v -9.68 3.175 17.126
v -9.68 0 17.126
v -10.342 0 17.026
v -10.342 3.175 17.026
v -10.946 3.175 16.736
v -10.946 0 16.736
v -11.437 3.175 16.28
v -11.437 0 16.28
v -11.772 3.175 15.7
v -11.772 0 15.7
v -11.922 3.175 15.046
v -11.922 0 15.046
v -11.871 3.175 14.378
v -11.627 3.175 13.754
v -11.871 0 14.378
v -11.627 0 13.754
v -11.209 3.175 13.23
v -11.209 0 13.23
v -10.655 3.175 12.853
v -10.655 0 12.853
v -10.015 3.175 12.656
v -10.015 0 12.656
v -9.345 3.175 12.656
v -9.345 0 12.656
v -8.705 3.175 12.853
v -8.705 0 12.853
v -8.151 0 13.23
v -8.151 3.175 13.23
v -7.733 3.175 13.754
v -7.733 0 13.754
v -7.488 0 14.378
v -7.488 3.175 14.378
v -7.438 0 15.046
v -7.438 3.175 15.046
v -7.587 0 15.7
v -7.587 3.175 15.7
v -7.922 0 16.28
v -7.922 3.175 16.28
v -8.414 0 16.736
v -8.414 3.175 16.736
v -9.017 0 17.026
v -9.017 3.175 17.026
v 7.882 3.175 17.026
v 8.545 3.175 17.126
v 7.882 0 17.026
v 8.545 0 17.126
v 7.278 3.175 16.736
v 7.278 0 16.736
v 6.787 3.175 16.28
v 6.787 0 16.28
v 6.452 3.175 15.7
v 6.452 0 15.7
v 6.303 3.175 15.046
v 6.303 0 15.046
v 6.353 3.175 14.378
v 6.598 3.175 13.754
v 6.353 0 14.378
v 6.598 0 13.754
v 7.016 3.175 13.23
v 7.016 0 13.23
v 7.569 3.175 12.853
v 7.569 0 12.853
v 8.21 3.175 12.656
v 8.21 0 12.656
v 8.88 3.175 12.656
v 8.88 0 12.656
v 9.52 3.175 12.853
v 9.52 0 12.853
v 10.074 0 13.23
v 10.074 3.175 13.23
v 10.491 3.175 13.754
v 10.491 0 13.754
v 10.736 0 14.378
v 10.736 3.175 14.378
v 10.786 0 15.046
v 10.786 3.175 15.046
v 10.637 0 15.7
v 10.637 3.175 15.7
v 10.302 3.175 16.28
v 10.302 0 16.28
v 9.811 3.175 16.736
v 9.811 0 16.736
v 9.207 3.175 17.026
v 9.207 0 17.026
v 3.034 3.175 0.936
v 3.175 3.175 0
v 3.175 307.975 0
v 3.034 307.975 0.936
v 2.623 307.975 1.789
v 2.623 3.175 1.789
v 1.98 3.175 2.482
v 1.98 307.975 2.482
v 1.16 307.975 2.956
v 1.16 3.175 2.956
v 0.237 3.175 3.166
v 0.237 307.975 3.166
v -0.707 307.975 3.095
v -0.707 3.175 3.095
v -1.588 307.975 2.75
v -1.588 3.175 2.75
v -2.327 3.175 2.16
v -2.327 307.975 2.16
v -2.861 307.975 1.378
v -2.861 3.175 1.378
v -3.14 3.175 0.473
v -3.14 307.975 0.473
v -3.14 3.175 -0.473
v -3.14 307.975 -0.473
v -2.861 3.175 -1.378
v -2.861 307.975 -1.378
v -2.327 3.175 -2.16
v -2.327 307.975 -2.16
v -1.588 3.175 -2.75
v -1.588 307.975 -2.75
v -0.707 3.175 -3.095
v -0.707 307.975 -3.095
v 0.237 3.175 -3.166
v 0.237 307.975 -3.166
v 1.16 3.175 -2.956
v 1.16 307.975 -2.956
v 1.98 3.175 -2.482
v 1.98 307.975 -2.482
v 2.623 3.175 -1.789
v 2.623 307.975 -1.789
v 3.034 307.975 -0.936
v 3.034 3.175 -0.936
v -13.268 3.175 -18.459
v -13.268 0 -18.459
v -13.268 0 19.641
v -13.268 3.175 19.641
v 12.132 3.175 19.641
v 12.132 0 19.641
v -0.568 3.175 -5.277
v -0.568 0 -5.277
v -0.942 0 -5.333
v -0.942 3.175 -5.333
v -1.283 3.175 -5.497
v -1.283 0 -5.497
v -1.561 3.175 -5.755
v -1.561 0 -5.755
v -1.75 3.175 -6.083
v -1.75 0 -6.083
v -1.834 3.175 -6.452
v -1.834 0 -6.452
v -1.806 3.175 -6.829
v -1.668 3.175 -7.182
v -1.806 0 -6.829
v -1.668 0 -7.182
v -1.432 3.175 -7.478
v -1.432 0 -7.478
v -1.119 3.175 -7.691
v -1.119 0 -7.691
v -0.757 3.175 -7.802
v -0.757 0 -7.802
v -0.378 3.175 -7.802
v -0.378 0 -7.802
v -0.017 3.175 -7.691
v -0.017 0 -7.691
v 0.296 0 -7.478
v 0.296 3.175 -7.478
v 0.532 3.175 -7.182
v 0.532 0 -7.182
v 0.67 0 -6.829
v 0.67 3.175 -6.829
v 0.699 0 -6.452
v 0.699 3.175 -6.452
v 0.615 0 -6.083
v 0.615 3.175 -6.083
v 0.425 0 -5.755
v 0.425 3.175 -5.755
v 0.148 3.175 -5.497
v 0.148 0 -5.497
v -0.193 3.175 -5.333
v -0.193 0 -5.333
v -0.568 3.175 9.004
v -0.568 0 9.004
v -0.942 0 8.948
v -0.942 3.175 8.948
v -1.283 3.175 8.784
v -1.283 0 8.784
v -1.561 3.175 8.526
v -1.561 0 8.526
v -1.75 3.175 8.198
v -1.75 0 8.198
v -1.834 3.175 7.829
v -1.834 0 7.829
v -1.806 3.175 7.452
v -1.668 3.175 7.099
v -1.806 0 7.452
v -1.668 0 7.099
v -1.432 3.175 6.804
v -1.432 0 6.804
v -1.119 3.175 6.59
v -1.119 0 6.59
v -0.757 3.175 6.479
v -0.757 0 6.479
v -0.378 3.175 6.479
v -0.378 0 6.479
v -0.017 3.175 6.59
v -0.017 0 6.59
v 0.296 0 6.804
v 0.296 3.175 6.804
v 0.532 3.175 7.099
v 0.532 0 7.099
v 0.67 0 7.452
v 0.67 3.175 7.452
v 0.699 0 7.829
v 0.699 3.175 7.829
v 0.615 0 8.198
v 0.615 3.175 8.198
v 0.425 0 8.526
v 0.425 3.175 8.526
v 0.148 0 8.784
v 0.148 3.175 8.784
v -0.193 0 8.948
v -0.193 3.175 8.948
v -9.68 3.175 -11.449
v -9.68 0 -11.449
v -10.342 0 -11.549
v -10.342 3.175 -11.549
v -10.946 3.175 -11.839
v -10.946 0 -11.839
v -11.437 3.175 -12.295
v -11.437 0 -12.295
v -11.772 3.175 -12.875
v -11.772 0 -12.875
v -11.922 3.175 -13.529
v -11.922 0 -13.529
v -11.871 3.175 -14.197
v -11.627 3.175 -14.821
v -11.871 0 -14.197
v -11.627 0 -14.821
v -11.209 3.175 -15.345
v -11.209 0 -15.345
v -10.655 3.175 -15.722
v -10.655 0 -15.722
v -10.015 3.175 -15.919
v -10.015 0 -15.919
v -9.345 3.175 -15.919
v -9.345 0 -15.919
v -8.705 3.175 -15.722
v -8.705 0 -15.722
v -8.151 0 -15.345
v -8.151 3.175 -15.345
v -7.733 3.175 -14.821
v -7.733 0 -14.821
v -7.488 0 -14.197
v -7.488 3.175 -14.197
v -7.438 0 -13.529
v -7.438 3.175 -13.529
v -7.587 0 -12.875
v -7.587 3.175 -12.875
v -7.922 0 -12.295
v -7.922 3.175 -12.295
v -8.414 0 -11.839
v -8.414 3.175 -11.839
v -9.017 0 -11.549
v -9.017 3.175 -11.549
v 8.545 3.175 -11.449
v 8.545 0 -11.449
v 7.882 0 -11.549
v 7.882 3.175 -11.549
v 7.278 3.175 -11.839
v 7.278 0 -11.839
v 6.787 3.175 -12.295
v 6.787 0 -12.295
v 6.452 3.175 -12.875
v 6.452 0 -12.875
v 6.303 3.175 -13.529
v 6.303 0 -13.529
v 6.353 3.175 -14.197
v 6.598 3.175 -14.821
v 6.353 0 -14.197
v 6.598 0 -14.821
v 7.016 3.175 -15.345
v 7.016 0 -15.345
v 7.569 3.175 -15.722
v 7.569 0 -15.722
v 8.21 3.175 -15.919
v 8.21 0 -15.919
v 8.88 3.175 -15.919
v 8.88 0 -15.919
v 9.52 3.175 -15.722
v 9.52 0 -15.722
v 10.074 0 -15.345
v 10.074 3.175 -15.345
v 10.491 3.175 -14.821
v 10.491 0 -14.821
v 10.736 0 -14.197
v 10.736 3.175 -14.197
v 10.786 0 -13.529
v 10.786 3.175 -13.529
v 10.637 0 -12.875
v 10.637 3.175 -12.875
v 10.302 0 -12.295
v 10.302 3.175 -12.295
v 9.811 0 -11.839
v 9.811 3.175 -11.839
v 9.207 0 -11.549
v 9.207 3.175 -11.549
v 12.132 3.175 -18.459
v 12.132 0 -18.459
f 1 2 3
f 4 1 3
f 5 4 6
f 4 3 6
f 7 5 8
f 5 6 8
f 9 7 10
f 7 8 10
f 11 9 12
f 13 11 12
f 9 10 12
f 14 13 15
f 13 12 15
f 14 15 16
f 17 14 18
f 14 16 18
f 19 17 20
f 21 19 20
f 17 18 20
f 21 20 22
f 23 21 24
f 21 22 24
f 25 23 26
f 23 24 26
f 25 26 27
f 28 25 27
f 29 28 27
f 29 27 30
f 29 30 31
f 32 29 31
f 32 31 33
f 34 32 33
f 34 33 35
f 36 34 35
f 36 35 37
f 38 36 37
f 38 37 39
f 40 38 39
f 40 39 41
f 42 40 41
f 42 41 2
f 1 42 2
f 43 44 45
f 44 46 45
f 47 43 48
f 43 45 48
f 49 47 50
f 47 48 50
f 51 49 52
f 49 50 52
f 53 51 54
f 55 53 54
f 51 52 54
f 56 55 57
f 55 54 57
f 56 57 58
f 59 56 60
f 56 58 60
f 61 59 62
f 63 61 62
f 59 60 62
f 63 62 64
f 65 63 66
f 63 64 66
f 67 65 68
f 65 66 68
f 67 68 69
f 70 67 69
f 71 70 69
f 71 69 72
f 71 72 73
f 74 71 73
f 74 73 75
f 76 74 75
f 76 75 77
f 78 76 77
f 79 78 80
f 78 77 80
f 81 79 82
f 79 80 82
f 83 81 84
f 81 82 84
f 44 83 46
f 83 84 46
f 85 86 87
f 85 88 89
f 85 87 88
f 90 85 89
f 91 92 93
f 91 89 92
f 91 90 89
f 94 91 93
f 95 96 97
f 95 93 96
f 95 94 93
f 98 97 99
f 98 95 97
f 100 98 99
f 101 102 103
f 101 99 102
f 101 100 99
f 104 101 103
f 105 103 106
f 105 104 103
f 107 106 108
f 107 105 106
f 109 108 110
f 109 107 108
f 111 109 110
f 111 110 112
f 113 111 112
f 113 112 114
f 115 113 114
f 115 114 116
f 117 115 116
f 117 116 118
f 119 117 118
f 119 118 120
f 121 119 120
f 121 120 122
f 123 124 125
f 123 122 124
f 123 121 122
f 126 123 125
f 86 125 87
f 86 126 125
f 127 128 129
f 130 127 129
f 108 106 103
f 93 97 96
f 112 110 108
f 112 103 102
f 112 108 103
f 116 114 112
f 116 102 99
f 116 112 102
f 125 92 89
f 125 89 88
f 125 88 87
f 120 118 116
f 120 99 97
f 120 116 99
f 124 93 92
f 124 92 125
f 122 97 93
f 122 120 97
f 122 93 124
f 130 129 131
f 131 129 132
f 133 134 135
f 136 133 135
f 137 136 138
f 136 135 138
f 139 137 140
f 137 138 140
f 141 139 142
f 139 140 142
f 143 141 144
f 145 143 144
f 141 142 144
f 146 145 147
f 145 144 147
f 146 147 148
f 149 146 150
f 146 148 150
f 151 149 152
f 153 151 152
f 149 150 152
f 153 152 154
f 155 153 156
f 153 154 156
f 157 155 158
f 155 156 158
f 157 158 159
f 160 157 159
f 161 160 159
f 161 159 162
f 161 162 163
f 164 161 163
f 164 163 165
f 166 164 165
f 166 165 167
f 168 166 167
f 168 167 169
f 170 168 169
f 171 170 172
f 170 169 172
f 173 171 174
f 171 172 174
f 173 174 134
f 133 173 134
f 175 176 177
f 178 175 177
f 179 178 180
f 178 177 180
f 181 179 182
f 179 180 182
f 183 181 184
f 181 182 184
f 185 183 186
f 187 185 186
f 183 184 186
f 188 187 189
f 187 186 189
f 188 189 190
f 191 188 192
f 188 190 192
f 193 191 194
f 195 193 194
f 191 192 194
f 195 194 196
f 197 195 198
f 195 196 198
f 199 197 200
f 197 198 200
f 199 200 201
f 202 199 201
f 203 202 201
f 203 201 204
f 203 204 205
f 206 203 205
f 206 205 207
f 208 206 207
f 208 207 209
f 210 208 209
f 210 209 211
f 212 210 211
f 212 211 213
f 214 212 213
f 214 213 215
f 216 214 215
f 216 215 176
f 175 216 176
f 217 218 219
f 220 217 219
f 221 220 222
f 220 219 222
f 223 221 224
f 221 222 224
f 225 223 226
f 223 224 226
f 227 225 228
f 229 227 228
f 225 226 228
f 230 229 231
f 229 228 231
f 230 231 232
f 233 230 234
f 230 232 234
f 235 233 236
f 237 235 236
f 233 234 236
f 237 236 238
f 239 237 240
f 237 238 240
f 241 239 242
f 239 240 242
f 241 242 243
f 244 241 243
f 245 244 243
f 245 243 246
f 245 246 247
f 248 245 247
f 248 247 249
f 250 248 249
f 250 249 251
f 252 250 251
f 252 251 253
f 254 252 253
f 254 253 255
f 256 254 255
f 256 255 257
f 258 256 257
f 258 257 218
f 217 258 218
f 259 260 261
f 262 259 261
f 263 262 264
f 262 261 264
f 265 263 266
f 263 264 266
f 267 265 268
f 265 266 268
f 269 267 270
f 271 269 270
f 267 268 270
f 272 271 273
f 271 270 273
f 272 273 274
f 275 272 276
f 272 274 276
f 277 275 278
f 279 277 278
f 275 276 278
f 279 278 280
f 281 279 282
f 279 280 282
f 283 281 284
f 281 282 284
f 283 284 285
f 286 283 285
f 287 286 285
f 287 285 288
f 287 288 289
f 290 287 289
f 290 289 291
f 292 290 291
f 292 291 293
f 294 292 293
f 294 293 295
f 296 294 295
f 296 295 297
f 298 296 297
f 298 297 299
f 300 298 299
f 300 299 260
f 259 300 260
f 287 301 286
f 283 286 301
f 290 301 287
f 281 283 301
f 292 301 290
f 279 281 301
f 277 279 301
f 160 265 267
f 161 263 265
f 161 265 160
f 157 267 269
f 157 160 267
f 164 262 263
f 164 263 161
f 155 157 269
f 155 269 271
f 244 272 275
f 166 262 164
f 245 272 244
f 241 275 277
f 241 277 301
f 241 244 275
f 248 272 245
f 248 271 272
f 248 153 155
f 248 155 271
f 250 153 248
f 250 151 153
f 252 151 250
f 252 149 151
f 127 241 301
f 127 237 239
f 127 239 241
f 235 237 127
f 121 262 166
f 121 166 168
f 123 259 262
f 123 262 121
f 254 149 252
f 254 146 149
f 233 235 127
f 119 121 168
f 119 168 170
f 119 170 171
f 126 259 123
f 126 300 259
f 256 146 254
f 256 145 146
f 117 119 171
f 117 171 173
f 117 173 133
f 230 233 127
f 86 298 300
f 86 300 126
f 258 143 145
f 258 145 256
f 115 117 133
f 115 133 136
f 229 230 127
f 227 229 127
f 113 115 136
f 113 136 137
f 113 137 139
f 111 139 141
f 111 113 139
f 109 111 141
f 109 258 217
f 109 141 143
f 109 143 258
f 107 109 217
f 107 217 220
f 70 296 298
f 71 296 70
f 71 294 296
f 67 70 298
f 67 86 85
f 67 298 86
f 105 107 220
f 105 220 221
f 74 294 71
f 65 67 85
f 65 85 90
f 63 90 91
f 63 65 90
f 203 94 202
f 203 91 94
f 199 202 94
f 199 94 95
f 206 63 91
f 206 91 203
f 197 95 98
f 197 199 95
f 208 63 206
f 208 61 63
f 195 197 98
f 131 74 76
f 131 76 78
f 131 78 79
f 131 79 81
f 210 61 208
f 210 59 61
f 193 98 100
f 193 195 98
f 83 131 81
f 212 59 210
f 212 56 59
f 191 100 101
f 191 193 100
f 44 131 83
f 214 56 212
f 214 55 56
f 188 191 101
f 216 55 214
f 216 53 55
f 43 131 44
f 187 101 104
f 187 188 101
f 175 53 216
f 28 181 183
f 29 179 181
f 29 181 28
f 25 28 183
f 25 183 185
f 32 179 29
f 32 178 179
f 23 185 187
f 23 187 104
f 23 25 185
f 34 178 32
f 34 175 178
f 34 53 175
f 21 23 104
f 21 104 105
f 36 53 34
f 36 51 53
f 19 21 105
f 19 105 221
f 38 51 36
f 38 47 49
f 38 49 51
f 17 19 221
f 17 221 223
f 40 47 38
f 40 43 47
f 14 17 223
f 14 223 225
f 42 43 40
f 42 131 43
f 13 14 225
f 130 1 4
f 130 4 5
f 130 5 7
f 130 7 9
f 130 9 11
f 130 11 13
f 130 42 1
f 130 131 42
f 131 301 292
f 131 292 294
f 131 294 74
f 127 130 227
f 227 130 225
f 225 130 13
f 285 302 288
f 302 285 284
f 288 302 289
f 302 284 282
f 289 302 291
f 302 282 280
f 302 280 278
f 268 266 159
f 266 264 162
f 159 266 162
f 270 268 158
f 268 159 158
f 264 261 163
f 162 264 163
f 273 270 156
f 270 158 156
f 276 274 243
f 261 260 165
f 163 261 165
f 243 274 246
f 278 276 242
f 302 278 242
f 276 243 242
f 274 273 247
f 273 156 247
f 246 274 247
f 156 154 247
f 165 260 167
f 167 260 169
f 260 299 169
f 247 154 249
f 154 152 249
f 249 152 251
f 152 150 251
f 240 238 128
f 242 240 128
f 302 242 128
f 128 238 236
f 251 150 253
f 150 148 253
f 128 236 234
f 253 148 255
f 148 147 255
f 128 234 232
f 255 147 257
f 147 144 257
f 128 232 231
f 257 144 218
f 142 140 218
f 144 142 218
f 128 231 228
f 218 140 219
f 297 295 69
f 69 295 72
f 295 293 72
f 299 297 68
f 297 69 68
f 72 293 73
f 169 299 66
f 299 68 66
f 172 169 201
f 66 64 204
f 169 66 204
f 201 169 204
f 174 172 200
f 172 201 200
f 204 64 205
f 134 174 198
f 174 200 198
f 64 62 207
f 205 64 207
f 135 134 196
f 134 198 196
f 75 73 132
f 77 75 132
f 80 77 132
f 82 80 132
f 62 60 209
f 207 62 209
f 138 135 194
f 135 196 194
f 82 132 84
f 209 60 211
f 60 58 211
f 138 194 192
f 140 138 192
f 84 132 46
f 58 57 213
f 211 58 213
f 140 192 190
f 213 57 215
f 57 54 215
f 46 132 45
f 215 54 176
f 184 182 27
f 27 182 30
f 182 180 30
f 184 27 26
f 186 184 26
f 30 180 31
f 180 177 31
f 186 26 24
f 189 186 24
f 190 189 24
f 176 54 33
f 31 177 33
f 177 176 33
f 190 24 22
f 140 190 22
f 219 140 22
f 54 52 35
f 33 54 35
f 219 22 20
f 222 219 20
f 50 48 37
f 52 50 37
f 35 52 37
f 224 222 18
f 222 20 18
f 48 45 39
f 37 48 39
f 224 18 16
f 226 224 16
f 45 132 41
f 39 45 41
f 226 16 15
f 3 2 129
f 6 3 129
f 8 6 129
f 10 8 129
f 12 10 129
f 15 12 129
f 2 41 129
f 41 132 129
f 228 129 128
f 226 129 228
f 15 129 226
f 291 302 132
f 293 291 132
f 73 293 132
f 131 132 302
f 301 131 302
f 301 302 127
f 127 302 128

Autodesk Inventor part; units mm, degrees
ref_plane "YZ Plane" through (0, 0, 0) normal (1, 0, 0) x (0, 1, 0)
ref_plane "XZ Plane" through (0, 0, 0) normal (0, 1, 0) x (-1, 0, 0)
ref_plane "XY Plane" through (0, 0, 0) normal (0, 0, 1) x (1, 0, 0)
sketch "Sketch1" plane through (0, 0, 0) normal (0, 1, 0) x (-1, 0, 0)
  line L0 (13.2677, 19.6408) -> (-12.1323, 19.6408)
  line L1 (-12.1323, 19.6408) -> (-12.1323, -18.4592)
  line L2 (-12.1323, -18.4592) -> (13.2677, -18.4592)
  line L3 (13.2677, -18.4592) -> (13.2677, 19.6408)
  point P0 (0, 0)
  dimension "d0" = 25.4
  dimension "d1" = 38.1
extrude "Extrusion1" add sketch "Sketch1" along normal blind 3.175
hole "Hole1" at (-9.6799, 3.175, 14.8783) direction (0, -1, 0) diameter 4.4958 depth 3.175 clearance for "Flat Head Machine Screw (82)" size "#8" standard "Ansi Unified Screw Threads"
hole "Hole2" at (8.5446, 3.175, 14.8783) direction (0, -1, 0) diameter 4.4958 depth 3.175 clearance for "Flat Head Machine Screw (82)" size "#8" standard "Ansi Unified Screw Threads"
hole "Hole3" at (-9.6799, 3.175, -13.6967) direction (0, -1, 0) diameter 4.4958 depth 3.175 clearance for "Flat Head Machine Screw (82)" size "#8" standard "Ansi Unified Screw Threads"
hole "Hole4" at (8.5446, 3.175, -13.6967) direction (0, -1, 0) diameter 4.4958 depth 3.175 clearance for "Flat Head Machine Screw (82)" size "#8" standard "Ansi Unified Screw Threads"
hole "Hole5" at (-0.5677, 3.175, -6.5466) direction (0, -1, 0) diameter 2.54 depth 3.175
hole "Hole6" at (-0.5677, 3.175, 7.7345) direction (0, -1, 0) diameter 2.54 depth 3.175
sketch "Sketch2" plane through (0, 3.175, 0) normal (0, 1, 0) x (1, 0, 0)
  circle A0 centre (0, 0) radius 3.175
  dimension "d58" = 6.35
extrude "Extrusion2" add sketch "Sketch2" along normal blind 304.8
sketch "Sketch3" plane through (0, 0, 0) normal (1, 0, 0) x (0, 1, 0)
  point P0 (0, 0)
properties part number "rotatable rod table"
